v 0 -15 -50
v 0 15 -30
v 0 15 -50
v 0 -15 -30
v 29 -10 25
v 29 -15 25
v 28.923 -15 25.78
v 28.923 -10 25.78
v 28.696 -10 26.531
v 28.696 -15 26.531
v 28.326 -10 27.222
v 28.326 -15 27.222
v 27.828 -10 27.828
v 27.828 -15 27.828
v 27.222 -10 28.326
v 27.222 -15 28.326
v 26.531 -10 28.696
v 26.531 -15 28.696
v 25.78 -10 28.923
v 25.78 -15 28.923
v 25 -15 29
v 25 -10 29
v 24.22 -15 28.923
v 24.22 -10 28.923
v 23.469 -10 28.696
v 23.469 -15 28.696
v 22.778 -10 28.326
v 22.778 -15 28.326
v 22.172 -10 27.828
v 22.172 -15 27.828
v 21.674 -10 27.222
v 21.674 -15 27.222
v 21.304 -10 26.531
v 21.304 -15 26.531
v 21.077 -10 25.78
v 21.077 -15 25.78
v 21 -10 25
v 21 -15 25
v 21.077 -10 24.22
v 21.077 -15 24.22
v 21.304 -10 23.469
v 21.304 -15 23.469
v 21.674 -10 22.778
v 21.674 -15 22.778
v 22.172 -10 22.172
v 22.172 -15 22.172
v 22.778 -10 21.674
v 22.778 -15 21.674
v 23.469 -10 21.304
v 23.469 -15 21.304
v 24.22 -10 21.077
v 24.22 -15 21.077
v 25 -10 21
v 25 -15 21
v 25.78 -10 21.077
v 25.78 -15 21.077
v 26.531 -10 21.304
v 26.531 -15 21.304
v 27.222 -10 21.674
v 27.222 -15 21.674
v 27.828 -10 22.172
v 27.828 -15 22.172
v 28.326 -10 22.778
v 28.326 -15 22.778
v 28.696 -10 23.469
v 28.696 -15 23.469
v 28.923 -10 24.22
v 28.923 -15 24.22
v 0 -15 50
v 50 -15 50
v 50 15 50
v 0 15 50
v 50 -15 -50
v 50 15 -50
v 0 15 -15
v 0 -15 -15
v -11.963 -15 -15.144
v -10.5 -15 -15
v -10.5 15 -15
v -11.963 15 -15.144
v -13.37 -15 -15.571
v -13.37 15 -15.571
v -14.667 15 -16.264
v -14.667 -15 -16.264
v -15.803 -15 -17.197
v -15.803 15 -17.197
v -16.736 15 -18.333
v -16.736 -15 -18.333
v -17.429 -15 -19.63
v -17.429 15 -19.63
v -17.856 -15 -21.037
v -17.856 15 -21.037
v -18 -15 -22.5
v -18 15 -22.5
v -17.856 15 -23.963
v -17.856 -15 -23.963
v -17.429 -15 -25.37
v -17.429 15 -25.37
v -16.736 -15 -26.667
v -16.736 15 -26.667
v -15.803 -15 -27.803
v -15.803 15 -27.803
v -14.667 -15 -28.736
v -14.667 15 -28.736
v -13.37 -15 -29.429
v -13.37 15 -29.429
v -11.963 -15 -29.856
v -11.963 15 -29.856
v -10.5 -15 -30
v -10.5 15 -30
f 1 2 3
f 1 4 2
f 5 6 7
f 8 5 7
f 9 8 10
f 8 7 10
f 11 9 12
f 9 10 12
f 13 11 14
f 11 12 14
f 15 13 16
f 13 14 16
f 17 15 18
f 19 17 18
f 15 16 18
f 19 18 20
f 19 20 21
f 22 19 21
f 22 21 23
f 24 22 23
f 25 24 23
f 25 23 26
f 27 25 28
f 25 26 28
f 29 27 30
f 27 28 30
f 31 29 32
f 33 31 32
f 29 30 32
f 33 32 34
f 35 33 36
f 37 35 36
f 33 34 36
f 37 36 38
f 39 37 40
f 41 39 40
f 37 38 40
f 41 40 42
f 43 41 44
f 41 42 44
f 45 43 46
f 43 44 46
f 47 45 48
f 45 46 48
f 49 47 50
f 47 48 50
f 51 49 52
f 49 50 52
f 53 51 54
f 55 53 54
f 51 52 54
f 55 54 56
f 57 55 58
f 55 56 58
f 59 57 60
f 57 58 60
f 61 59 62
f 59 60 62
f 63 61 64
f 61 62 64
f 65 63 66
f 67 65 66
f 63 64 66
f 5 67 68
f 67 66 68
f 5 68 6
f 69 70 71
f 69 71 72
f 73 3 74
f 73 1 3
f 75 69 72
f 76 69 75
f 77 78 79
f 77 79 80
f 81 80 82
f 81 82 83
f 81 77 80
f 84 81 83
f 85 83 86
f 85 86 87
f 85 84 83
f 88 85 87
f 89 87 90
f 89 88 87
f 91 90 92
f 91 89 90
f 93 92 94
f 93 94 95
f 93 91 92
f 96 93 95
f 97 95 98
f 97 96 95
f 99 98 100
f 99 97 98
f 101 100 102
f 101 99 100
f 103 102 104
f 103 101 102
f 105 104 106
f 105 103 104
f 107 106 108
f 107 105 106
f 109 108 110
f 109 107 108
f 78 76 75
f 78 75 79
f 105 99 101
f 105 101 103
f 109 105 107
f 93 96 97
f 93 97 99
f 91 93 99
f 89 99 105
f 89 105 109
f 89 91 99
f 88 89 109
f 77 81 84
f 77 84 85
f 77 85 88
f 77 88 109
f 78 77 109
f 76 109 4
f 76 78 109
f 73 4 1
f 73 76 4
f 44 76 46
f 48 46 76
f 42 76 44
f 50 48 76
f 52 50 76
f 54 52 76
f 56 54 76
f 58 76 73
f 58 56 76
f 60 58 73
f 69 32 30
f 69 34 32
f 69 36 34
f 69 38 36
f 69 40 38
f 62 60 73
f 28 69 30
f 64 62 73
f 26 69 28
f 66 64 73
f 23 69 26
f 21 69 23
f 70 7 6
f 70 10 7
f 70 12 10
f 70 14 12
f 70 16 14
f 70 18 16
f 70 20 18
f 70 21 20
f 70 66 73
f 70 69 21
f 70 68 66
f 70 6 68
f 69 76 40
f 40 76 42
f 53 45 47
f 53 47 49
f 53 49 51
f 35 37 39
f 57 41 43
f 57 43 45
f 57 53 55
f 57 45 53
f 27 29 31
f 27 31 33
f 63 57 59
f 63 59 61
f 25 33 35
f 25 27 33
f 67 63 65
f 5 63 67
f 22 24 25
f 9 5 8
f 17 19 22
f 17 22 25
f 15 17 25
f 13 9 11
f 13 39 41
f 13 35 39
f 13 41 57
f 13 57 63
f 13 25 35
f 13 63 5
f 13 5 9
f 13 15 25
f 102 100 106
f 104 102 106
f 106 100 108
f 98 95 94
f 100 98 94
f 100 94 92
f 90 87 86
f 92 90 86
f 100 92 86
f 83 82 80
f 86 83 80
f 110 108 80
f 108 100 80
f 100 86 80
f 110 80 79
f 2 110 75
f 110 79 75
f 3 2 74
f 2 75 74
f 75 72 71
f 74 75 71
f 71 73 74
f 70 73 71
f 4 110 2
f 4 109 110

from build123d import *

# Parameters (mm, degrees)
F1_DEPTH = 15
F2_R     = 4
F3_DEPTH = 5


with BuildPart() as f1:
    # F0 (on Front) → F1 (new body, symmetric)
    with BuildSketch(Plane.XZ):
        with BuildLine():
            Line((0, -50), (50, -50))
            Line((50, -50), (50, 50))
            Line((50, 50), (0, 50))
            Line((0, 50), (0, -15))
            Line((0, -15), (-10.5, -15))
            ThreePointArc((-10.5, -15), (-18, -22.5), (-10.5, -30))
            Line((-10.5, -30), (0, -30))
            Line((0, -30), (0, -50))
        make_face()
    extrude(amount=F1_DEPTH, both=True)

    # F2 (on face) → F3 (cut)
    with BuildSketch(Plane.XZ.offset(15)):
        with Locations((25, 25)):
            Circle(F2_R)
    extrude(amount=-F3_DEPTH, mode=Mode.SUBTRACT)


solid = f1.part
